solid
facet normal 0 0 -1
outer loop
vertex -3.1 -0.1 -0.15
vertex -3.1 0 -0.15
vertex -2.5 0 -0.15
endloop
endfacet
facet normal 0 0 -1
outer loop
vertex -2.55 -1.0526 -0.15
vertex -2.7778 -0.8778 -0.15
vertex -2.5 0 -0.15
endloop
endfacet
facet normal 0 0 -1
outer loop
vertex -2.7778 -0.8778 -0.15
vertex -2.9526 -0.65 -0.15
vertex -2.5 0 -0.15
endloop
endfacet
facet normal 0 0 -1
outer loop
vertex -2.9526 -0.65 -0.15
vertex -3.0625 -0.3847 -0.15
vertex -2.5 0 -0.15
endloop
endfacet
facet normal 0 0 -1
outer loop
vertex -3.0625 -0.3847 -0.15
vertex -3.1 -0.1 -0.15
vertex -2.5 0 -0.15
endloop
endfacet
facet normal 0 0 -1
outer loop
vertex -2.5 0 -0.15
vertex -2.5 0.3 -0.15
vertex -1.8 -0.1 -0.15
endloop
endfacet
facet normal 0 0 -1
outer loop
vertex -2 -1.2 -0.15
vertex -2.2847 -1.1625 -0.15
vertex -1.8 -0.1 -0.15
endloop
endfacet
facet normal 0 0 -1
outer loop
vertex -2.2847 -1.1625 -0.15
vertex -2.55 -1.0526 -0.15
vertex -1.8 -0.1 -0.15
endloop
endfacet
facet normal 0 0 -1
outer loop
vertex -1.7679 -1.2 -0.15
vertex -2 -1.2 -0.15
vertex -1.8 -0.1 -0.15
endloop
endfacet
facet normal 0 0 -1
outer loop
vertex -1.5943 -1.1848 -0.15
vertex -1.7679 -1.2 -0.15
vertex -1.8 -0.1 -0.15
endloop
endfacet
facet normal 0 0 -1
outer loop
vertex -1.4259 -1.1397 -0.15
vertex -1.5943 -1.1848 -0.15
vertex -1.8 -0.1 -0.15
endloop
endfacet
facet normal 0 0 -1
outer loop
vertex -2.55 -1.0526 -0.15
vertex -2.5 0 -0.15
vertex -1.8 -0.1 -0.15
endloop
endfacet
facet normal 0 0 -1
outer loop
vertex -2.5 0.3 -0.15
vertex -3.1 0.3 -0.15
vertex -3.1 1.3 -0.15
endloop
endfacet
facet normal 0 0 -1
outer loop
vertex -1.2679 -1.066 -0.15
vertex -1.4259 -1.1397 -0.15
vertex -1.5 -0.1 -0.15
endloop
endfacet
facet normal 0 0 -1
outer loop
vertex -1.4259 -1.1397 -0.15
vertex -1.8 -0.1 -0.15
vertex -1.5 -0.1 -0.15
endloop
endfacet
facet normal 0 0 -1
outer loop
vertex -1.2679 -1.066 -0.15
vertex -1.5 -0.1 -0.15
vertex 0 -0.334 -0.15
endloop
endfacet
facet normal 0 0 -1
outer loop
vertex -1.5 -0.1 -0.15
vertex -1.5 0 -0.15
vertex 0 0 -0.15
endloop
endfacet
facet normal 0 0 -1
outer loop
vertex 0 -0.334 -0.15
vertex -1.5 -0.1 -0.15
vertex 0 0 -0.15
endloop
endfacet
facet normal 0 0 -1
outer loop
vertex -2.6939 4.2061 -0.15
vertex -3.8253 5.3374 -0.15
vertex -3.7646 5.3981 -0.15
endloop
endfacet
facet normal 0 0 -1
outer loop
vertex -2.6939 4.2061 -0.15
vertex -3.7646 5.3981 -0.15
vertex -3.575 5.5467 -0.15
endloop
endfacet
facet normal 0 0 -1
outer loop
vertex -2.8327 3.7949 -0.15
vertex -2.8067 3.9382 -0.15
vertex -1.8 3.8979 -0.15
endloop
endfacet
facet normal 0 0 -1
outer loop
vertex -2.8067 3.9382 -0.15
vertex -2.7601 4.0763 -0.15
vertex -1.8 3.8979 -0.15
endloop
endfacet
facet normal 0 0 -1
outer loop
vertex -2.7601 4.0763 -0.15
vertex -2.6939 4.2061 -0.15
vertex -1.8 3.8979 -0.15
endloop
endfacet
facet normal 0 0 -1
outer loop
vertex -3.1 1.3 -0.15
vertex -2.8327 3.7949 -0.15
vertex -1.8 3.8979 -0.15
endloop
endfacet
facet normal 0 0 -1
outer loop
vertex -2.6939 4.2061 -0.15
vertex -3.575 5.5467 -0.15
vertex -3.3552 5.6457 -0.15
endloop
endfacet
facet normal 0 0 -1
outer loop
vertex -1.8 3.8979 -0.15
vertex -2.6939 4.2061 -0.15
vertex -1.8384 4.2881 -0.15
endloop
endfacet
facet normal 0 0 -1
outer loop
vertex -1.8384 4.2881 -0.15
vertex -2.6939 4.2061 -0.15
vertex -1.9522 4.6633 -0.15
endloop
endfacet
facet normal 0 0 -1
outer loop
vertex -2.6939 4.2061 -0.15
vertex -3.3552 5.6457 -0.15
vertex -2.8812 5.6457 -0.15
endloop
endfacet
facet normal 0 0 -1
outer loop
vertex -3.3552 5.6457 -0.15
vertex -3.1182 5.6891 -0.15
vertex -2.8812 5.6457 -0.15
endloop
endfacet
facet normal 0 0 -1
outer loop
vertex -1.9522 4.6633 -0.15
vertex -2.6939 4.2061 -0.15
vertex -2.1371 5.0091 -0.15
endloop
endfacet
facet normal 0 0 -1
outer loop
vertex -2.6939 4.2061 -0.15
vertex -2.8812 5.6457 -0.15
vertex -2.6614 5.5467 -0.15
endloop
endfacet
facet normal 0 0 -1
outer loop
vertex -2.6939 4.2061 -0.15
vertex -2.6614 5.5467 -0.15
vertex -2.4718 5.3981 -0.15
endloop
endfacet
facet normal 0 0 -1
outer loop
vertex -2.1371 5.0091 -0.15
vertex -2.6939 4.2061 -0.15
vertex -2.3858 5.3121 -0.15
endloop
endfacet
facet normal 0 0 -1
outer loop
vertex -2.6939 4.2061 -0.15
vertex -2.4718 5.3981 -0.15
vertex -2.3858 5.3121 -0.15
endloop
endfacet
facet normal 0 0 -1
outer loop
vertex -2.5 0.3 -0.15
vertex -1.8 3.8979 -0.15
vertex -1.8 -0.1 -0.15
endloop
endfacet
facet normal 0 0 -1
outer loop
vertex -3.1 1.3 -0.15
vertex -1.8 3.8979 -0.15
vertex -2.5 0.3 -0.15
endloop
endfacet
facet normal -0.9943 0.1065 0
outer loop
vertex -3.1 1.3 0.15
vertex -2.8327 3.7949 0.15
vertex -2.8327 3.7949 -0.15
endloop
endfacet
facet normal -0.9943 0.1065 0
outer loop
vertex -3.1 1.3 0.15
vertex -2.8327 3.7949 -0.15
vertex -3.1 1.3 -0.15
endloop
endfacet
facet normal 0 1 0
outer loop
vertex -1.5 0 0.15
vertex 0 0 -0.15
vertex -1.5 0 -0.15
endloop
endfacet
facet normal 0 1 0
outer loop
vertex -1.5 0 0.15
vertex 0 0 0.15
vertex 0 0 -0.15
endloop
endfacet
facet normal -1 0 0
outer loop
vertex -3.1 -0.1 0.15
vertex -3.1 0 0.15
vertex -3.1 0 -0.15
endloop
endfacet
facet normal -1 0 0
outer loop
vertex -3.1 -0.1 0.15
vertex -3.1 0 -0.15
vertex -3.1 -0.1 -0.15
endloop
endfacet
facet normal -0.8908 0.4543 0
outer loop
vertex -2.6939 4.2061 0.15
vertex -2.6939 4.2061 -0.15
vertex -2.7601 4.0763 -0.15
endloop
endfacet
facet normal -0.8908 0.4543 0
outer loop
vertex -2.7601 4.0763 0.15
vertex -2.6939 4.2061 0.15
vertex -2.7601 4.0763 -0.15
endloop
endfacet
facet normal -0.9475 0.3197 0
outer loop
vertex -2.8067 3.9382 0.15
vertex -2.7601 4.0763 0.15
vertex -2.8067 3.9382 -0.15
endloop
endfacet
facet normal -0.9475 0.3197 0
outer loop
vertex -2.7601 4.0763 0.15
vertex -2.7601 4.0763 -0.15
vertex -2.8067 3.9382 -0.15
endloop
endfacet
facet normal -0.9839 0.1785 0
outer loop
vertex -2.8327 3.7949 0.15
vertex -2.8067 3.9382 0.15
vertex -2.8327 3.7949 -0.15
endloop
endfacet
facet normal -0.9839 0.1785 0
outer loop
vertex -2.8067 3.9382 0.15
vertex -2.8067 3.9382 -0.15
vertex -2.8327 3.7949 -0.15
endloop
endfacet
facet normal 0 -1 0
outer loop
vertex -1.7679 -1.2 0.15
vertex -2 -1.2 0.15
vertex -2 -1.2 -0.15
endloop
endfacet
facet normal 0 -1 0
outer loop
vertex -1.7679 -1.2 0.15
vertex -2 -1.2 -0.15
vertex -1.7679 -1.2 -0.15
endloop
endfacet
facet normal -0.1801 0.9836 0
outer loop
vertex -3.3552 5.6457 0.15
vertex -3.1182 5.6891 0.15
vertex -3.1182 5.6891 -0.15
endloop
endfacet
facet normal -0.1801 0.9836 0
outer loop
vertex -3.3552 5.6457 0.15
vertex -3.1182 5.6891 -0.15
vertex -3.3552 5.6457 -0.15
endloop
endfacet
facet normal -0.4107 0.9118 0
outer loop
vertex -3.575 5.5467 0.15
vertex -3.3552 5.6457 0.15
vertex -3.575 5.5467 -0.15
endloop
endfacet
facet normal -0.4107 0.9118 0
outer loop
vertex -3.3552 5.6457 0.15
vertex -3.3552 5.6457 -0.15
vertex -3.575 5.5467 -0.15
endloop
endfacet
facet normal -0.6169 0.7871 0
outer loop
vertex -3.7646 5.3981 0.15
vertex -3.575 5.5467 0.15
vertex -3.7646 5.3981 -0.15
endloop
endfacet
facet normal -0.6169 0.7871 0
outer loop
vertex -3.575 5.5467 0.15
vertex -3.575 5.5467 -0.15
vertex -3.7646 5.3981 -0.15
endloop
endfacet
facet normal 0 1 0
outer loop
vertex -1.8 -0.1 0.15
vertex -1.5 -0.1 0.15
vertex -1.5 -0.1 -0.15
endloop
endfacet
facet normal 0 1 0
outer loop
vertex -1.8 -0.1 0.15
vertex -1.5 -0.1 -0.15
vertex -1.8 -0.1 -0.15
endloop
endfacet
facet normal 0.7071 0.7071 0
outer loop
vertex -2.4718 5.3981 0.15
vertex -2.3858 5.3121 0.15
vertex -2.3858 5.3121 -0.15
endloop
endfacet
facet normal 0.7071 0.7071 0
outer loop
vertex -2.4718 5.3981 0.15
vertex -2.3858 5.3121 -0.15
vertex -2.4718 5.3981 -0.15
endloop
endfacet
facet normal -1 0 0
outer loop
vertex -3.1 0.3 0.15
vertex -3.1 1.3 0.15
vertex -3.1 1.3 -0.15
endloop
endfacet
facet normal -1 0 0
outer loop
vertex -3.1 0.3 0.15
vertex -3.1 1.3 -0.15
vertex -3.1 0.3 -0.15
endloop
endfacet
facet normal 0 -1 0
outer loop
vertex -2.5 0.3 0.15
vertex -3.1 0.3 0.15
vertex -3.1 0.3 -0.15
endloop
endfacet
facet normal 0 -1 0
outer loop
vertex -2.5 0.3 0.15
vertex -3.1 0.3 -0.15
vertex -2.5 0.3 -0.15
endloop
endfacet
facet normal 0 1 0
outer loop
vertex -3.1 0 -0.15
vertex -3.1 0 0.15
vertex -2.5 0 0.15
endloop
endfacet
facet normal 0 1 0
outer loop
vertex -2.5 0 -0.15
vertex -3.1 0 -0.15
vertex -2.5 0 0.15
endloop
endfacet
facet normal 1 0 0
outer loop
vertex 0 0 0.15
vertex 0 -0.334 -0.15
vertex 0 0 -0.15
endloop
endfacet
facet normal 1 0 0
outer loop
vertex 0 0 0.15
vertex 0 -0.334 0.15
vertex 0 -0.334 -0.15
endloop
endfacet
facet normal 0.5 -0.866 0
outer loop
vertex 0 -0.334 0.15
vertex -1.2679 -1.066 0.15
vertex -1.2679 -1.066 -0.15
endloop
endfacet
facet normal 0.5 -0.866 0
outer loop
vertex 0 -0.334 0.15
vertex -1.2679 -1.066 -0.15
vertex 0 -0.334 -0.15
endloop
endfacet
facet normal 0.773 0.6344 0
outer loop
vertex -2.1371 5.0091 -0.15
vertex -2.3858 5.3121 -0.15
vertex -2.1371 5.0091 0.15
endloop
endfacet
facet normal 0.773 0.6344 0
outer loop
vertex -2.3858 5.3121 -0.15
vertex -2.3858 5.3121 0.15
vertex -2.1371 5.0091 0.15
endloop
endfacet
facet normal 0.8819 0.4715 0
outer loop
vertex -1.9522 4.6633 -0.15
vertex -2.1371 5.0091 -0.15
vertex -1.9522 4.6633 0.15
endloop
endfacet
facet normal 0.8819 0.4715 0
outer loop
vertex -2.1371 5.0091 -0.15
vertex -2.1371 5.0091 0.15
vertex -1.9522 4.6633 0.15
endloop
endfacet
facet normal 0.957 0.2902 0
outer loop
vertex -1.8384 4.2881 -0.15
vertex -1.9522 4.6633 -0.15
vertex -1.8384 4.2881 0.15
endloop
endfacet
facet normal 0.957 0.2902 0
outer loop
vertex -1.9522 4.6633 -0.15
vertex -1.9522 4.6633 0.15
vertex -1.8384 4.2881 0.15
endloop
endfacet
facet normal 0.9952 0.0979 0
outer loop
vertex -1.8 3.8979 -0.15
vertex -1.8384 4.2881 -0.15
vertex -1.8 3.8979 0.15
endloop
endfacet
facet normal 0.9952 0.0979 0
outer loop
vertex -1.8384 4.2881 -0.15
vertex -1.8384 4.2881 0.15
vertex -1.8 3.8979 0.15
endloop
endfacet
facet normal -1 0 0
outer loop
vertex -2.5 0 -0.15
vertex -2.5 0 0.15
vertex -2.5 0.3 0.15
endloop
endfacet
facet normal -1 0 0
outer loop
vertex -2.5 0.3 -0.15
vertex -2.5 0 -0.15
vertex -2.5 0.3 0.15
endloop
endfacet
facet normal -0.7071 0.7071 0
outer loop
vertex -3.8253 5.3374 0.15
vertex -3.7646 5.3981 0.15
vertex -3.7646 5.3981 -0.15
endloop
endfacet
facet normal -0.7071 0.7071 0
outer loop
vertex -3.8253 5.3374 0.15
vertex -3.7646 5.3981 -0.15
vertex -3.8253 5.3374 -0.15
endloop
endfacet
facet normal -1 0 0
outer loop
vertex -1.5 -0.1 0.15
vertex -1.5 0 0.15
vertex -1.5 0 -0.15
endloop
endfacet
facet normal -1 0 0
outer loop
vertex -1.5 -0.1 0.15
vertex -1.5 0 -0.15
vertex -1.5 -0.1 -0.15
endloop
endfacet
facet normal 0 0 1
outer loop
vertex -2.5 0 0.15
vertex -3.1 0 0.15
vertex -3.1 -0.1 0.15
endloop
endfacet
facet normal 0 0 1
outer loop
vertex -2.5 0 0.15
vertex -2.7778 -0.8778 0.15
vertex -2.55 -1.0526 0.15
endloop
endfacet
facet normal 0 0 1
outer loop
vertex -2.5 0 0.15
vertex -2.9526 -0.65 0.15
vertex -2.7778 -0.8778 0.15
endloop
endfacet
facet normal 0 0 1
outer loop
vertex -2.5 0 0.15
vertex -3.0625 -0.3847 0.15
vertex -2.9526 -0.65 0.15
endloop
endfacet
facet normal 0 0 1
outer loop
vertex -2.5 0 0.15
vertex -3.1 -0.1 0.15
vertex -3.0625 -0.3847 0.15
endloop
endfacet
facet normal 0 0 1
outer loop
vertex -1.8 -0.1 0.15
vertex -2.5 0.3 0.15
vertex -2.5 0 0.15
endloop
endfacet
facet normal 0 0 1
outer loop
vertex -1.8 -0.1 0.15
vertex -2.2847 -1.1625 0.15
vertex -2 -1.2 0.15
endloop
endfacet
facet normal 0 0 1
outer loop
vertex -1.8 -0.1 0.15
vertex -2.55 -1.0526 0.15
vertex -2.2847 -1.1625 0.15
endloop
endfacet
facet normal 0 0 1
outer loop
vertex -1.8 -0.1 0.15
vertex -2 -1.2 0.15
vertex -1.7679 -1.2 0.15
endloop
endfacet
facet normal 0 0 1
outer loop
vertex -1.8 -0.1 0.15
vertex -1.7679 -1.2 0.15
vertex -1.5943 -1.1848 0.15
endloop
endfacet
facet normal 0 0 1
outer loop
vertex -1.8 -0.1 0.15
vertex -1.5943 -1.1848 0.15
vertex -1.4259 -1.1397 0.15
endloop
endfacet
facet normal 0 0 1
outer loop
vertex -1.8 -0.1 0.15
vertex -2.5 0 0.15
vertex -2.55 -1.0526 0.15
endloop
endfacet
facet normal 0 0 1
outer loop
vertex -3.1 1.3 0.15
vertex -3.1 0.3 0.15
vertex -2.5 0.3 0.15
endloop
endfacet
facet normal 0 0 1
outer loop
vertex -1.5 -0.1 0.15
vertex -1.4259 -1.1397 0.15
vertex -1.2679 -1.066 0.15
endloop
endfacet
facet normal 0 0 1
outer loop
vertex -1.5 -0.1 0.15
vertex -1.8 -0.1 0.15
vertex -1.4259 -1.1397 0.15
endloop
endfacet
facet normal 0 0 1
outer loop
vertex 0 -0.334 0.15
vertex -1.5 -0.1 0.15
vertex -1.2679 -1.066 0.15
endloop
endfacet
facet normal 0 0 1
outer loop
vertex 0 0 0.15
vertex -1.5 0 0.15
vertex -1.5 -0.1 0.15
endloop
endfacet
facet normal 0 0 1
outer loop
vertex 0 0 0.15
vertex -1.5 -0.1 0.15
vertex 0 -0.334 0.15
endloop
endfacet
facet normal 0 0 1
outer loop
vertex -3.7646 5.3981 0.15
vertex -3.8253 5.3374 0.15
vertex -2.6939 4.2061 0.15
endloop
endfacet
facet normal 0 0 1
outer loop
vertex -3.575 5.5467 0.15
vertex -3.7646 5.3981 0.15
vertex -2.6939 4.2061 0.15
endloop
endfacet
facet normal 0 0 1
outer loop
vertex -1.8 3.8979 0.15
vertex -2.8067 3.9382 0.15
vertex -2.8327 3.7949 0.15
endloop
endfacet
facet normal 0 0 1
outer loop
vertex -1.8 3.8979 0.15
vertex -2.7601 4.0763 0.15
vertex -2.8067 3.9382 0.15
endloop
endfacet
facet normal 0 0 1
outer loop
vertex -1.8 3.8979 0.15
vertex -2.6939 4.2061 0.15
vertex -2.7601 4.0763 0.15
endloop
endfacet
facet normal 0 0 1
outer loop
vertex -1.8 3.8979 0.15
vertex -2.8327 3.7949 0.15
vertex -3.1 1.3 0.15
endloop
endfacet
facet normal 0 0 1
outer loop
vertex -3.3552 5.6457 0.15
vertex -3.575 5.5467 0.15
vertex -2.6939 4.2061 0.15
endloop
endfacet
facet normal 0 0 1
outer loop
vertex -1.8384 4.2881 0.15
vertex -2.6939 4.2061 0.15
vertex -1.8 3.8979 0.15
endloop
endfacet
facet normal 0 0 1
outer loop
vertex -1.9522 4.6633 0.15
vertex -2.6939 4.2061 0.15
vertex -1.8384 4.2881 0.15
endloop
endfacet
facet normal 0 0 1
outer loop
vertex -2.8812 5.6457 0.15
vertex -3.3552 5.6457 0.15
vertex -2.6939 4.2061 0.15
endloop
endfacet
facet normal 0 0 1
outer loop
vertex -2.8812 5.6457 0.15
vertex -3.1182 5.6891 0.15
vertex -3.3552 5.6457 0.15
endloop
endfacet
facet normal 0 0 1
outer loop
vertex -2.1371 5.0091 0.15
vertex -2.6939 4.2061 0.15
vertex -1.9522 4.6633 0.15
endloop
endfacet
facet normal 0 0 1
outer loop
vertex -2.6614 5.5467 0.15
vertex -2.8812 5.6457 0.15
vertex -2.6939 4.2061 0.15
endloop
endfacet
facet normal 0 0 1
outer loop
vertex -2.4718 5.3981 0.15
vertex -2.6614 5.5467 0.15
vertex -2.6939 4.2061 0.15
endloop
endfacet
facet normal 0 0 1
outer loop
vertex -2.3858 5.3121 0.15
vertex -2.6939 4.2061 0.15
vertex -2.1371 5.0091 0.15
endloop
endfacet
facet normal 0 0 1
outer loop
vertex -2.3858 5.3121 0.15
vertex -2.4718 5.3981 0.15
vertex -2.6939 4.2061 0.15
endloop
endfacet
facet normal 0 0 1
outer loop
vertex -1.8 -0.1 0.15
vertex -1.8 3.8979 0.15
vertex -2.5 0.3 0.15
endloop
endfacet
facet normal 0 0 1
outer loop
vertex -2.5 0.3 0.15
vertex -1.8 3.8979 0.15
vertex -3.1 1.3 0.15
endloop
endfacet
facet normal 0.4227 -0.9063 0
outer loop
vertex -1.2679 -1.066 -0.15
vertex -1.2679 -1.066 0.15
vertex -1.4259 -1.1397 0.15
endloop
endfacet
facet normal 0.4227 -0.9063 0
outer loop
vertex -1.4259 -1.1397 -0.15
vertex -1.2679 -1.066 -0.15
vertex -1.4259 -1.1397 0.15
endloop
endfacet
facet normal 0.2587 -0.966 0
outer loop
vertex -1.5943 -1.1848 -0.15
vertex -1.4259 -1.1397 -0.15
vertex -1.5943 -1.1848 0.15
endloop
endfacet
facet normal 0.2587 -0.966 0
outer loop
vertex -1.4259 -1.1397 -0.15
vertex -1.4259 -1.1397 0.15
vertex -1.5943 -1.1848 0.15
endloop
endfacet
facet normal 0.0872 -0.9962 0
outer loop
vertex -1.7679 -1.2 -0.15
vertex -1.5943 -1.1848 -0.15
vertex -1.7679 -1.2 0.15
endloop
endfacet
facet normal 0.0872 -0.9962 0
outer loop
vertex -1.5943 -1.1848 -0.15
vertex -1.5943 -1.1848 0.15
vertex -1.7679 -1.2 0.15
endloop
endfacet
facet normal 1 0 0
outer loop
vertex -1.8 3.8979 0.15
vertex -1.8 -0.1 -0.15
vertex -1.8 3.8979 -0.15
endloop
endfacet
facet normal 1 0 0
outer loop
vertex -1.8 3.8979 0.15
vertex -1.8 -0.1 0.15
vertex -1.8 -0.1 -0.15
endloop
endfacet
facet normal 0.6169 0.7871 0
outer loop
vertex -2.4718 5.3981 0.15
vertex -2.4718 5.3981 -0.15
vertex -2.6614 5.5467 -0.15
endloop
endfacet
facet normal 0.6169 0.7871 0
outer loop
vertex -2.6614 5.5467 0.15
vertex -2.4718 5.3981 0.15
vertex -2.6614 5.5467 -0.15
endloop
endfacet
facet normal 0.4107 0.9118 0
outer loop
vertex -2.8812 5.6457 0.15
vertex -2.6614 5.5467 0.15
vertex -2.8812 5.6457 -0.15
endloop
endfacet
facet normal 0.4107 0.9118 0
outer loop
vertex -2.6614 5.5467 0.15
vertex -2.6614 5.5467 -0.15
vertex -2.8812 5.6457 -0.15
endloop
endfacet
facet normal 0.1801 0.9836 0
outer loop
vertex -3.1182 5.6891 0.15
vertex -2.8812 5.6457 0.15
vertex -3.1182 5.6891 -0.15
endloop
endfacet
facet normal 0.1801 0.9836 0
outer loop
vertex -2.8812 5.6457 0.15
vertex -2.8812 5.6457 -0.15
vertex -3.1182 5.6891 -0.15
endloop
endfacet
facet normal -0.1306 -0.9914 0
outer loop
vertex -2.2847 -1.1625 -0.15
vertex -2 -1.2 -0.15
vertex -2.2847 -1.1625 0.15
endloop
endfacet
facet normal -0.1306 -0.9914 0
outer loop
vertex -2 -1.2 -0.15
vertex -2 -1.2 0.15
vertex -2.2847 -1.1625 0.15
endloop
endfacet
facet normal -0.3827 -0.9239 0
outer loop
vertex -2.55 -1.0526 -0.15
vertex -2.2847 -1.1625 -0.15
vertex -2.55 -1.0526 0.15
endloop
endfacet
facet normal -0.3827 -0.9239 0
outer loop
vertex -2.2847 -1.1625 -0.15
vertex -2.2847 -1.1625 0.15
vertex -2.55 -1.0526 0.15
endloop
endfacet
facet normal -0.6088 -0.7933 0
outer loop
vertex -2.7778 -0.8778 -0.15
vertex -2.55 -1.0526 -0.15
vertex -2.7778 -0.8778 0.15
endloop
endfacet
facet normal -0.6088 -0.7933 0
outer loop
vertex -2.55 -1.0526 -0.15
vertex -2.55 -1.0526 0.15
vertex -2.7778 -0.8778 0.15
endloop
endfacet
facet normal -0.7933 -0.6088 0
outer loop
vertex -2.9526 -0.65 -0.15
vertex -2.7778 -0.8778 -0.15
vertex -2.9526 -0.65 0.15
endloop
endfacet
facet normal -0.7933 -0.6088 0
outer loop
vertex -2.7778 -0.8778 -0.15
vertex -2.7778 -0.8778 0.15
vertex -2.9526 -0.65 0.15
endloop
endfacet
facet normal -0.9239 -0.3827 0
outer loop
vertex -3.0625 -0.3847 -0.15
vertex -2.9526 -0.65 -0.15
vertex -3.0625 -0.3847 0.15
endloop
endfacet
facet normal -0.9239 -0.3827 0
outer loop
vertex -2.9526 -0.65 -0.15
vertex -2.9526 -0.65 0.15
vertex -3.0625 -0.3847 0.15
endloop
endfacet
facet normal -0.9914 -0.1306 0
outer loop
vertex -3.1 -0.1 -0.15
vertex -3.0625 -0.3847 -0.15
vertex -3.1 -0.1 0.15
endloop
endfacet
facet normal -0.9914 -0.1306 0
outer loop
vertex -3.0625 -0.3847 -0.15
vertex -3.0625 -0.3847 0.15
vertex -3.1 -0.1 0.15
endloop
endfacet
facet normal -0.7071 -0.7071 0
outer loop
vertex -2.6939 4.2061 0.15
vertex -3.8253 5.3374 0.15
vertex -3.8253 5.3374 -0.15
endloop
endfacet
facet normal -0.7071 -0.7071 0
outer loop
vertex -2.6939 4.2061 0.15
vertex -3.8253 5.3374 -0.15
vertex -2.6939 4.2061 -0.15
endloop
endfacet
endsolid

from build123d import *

# Parameters (mm, degrees)
BOSS_EXTRUDE1_DEPTH = 0.15
FILLET1_R           = 1.1
SKETCH2_W           = 0.6
SKETCH2_H           = 0.3
CUT_EXTRUDE1_DEPTH  = 7.86369632
FILLET2_R           = 2
FILLET3_R           = 1


with BuildPart() as part:
    # Sketch1 → Boss-Extrude1 (new, symmetric)
    with BuildSketch(Plane.XY):
        Polygon((0, 0), (-1.5, 0), (-1.5, -0.1), (-1.8, -0.1), (-1.8, 3.1), (-1.8, 3.517211082), (-1.8, 4.726345597), (-2.764644661, 5.690990258), (-3.471751442, 5.690990258), (-3.825304833, 5.337436867), (-2.693933983, 4.206066017), (-2.8, 4.1), (-3.1, 1.3), (-3.1, -1.2), (-2.8, -1.2), (-1.5, -1.2), (0, -0.333974596), align=None)
    extrude(amount=BOSS_EXTRUDE1_DEPTH, both=True)

    # Fillet1
    fillet1_edges = [part.edges().sort_by_distance(p)[0] for p in [
        (-3.1, -1.2, 0),
    ]]
    fillet(fillet1_edges, radius=FILLET1_R)

    # Sketch2 → Cut-Extrude1 (cut, through all)
    with BuildSketch(Plane.XY.offset(0.15)):
        with Locations((-2.8, 0.15)):
            Rectangle(SKETCH2_W, SKETCH2_H)
    extrude(amount=-CUT_EXTRUDE1_DEPTH, mode=Mode.SUBTRACT)

    # Fillet2
    fillet2_edges = [part.edges().sort_by_distance(p)[0] for p in [
        (-1.8, 4.726345597, 0),
    ]]
    fillet(fillet2_edges, radius=FILLET2_R)

    # Fillet3
    # the kernel refuses this fillet: 1 mm, written as the material it takes off along each edge
    with BuildSketch(Plane(origin=(-2.8, 4.1, -0.917160411), x_dir=(0.7071067811865565, 0.7071067811865387, 0), z_dir=(0, 0, 1))) as fillet3_piece_1:
        with BuildLine():
            CenterArc((0.388885384, -0.971047771), FILLET3_R, 103.820764191, 25.063732242)
            Line((-0.238867067, -0.192634731), (-0.251422116, -0.177066471))
            Line((-0.251422116, -0.177066471), (-0.012555049, 0.015568261))
            Line((-0.012555049, 0.015568261), (0, 0.02))
            ThreePointArc((0, 0.02), (0.075, 0.02), (0.145222292, 0.019420955))
            Line((0.145222292, 0.019420955), (0.15, 0))
        make_face()
    extrude(amount=1.834320821, mode=Mode.SUBTRACT)
    with BuildSketch(Plane(origin=(-1.5, -1.2, 0.819872981), x_dir=(0.8660254037844393, 0.49999999999999883, 0), z_dir=(0, 0, -1))) as fillet3_piece_2:
        with BuildLine():
            CenterArc((FILLET3_R * 0.267949192431, -FILLET3_R), FILLET3_R, 90, 30)
            Line((-FILLET3_R * 0.232050807569, -FILLET3_R * 0.133974596216), (-FILLET3_R * 0.242050807569, -FILLET3_R * 0.11665408814))
            Line((-FILLET3_R * 0.242050807569, -FILLET3_R * 0.11665408814), (-FILLET3_R * 0.00535898384862, FILLET3_R * 0.02))
            Line((-FILLET3_R * 0.00535898384862, FILLET3_R * 0.02), (FILLET3_R * 0.267949192431, FILLET3_R * 0.02))
            Line((FILLET3_R * 0.267949192431, FILLET3_R * 0.02), (FILLET3_R * 0.267949192431, 0))
        make_face()
    extrude(amount=1.639745962, mode=Mode.SUBTRACT)
    with BuildSketch(Plane(origin=(-3.471751442, 5.690990258, -1.185533906), x_dir=(1, 0, 0), z_dir=(0, 0, 1)), Plane(origin=(-2.764644661, 5.690990258, -1.185533906), x_dir=(0.7071067811865444, -0.7071067811865508, 0), z_dir=(0, 0, 1))) as fillet3_piece_3:
        with BuildLine():
            CenterArc((FILLET3_R * 0.414213562373, -FILLET3_R), FILLET3_R, 90, 45)
            Line((-FILLET3_R * 0.292893218813, -FILLET3_R * 0.292893218813), (-FILLET3_R * 0.307035354437, -FILLET3_R * 0.27875108319))
            Line((-FILLET3_R * 0.307035354437, -FILLET3_R * 0.27875108319), (-FILLET3_R * 0.00828427124746, FILLET3_R * 0.02))
            Line((-FILLET3_R * 0.00828427124746, FILLET3_R * 0.02), (FILLET3_R * 0.414213562373, FILLET3_R * 0.02))
            Line((FILLET3_R * 0.414213562373, FILLET3_R * 0.02), (FILLET3_R * 0.414213562373, 0))
        make_face()
    extrude(amount=2.371067812, mode=Mode.SUBTRACT)


solid = part.part
